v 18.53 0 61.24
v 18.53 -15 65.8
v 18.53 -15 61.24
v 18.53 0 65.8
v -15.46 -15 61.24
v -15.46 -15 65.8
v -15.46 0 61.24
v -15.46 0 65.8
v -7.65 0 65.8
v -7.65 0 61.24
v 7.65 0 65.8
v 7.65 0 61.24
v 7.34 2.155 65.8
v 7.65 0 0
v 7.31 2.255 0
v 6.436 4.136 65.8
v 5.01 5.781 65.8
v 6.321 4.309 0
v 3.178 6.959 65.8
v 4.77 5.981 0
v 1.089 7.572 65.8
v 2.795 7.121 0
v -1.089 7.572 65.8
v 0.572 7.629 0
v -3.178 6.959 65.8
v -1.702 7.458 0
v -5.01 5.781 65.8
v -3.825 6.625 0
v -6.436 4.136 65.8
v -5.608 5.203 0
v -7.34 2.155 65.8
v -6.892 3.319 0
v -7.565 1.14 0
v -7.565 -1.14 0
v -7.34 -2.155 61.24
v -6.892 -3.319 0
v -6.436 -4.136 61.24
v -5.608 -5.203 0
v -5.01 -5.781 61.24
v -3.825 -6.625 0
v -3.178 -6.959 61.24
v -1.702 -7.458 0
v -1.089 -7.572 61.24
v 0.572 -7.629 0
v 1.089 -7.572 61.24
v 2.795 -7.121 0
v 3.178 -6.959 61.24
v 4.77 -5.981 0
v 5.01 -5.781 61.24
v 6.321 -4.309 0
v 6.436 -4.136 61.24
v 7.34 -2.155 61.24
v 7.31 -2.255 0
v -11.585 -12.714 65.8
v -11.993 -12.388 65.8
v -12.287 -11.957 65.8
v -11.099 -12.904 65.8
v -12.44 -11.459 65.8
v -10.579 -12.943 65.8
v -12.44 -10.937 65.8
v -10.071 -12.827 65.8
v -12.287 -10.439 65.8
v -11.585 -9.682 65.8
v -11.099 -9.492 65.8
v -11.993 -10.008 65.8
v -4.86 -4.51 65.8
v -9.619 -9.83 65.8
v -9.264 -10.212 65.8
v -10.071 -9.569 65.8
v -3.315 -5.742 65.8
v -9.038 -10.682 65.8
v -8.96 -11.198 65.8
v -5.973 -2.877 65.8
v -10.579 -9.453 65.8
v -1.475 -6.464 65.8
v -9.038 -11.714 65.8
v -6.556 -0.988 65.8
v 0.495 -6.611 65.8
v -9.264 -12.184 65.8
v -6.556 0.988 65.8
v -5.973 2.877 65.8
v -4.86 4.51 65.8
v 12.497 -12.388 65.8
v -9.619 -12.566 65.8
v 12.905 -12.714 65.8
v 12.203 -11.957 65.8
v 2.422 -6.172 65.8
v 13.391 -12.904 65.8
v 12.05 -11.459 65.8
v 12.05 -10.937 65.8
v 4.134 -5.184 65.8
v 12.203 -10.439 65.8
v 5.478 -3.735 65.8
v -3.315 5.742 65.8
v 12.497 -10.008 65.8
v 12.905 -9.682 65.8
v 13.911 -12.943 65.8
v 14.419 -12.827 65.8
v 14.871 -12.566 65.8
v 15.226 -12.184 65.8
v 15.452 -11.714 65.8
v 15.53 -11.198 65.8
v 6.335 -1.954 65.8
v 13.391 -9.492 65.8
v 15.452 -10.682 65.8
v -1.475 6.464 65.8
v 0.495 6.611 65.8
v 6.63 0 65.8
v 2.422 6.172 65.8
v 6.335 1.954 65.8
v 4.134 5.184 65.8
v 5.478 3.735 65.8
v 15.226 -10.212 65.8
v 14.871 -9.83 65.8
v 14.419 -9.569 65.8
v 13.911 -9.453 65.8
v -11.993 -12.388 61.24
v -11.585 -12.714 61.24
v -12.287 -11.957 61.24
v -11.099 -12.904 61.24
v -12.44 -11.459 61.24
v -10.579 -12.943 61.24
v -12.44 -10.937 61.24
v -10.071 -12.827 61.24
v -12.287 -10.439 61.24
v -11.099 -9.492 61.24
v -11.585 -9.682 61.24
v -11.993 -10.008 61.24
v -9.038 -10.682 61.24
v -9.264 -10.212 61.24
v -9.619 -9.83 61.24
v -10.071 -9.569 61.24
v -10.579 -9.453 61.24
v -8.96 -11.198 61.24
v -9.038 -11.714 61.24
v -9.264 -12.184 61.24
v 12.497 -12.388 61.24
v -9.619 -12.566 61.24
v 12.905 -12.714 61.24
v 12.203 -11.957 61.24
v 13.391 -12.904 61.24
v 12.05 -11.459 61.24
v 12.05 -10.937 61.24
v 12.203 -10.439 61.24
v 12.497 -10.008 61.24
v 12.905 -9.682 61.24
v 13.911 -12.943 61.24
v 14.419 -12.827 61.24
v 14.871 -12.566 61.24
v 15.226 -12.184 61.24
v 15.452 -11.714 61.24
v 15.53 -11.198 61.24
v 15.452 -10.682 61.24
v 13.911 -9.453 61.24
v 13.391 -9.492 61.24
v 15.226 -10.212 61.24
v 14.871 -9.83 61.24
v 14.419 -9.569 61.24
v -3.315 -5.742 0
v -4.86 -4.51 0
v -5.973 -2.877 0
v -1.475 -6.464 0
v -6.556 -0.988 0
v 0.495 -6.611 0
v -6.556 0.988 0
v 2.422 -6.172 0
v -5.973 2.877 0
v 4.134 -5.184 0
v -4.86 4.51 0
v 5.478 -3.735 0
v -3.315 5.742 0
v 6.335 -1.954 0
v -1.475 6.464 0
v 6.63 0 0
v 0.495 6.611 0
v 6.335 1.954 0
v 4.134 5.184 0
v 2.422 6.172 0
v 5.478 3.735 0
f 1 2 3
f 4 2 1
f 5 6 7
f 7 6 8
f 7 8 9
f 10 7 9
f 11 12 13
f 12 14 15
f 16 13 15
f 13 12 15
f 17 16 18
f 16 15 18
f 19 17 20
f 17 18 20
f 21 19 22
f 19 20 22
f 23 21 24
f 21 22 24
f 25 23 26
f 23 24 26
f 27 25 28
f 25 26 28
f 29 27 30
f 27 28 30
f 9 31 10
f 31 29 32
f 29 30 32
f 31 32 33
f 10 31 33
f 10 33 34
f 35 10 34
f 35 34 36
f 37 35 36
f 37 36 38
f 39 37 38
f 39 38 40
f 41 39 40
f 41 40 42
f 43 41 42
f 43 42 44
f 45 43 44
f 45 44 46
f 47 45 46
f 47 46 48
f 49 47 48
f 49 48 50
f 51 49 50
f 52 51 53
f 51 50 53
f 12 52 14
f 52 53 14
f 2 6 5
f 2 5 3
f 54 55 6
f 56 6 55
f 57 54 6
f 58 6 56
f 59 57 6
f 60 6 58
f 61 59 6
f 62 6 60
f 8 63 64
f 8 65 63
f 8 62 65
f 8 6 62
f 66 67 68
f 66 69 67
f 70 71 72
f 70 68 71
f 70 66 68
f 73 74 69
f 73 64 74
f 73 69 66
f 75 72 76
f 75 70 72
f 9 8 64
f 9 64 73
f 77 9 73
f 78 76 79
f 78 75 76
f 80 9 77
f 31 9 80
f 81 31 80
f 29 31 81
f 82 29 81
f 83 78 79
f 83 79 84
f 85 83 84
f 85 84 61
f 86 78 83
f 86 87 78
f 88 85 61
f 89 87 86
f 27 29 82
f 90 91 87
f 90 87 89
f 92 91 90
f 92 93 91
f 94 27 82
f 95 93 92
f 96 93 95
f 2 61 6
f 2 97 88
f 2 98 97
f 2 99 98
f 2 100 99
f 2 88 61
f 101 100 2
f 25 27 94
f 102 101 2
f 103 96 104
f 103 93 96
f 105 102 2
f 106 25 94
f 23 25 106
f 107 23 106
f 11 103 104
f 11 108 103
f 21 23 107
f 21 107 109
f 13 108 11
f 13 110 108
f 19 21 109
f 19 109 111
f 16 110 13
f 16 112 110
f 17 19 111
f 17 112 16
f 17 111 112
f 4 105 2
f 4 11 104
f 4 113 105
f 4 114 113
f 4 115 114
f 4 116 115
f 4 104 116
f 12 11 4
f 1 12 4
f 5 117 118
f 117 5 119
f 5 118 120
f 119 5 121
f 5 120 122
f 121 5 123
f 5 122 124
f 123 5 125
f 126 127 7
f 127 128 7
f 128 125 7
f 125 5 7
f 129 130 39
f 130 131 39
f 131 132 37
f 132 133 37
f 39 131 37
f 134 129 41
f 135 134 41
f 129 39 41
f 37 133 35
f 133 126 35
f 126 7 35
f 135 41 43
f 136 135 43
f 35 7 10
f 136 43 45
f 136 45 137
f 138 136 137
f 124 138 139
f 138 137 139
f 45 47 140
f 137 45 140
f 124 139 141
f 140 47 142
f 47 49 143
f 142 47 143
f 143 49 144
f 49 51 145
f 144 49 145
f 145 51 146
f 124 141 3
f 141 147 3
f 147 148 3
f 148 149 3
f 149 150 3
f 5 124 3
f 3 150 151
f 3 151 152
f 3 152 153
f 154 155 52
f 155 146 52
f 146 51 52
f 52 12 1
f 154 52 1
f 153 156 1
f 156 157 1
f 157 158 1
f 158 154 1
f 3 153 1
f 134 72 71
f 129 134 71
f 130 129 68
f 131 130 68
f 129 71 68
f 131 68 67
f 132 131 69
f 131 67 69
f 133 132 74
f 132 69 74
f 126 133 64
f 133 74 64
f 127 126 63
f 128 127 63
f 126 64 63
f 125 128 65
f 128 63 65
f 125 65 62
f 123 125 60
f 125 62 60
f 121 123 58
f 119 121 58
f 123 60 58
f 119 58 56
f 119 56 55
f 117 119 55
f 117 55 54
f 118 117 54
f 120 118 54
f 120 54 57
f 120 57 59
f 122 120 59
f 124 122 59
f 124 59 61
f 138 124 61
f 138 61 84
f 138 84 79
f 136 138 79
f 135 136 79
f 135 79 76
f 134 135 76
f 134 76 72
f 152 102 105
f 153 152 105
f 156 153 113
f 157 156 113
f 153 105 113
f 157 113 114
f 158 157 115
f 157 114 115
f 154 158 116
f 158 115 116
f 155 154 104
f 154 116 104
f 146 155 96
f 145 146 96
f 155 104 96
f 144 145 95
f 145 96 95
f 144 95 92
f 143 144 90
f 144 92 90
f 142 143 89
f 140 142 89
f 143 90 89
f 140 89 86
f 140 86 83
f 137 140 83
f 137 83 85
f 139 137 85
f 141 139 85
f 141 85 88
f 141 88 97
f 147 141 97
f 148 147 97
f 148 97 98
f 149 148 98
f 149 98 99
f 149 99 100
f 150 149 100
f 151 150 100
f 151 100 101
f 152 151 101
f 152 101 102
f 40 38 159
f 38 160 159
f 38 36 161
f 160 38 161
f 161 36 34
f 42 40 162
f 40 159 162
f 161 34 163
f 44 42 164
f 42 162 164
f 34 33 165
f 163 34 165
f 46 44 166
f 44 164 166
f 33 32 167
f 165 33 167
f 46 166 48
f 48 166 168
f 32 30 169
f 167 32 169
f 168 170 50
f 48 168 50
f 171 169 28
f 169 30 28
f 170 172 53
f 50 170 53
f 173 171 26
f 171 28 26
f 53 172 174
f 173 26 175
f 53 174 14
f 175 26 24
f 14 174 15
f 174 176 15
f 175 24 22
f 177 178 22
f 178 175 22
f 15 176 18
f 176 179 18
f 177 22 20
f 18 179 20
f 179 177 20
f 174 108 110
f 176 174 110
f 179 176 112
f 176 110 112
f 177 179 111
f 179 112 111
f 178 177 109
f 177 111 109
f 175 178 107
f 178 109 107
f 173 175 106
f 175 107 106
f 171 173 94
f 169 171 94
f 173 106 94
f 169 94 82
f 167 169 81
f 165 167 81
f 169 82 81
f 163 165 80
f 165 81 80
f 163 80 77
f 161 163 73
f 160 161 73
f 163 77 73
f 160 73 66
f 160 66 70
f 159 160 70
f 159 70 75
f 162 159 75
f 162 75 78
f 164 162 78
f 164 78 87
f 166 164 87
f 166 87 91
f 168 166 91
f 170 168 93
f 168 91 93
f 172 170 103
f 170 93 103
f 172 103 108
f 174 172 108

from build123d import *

# Parameters (mm, degrees)
F0_R     = 7.65
F1_DEPTH = 65.8
F2_R     = 6.63
F3_DEPTH = 65.801
F4_W     = 33.99
F4_H     = 15
F5_DEPTH = 4.56
F6_R     = 6.63
F7_DEPTH = 65.801
F8_R     = 1.75
F9_DEPTH = 65.801


with BuildPart() as f1:
    # F0 (on Top) → F1 (new body)
    with BuildSketch(Plane.XY):
        Circle(F0_R)
    extrude(amount=F1_DEPTH)

    # F2 (on face) → F3 (cut, through all)
    with BuildSketch(Plane.XY.offset(65.8)):
        Circle(F2_R)
    extrude(amount=-F3_DEPTH, mode=Mode.SUBTRACT)

    # F4 (on face) → F5 (join)
    with BuildSketch(Plane.XY.offset(65.8)):
        with Locations((1.535, -7.5)):
            Rectangle(F4_W, F4_H)
    extrude(amount=-F5_DEPTH)

    # F6 (on face) → F7 (cut, through all)
    with BuildSketch(Plane.XY.offset(65.8)):
        Circle(F6_R)
    extrude(amount=-F7_DEPTH, mode=Mode.SUBTRACT)

    # F8 (on face) → F9 (cut, through all)
    with BuildSketch(Plane.XY.offset(65.8)):
        with Locations((-10.71, -11.198)):
            Circle(F8_R)
        with Locations((13.78, -11.198)):
            Circle(F8_R)
    extrude(amount=-F9_DEPTH, mode=Mode.SUBTRACT)


solid = f1.part
